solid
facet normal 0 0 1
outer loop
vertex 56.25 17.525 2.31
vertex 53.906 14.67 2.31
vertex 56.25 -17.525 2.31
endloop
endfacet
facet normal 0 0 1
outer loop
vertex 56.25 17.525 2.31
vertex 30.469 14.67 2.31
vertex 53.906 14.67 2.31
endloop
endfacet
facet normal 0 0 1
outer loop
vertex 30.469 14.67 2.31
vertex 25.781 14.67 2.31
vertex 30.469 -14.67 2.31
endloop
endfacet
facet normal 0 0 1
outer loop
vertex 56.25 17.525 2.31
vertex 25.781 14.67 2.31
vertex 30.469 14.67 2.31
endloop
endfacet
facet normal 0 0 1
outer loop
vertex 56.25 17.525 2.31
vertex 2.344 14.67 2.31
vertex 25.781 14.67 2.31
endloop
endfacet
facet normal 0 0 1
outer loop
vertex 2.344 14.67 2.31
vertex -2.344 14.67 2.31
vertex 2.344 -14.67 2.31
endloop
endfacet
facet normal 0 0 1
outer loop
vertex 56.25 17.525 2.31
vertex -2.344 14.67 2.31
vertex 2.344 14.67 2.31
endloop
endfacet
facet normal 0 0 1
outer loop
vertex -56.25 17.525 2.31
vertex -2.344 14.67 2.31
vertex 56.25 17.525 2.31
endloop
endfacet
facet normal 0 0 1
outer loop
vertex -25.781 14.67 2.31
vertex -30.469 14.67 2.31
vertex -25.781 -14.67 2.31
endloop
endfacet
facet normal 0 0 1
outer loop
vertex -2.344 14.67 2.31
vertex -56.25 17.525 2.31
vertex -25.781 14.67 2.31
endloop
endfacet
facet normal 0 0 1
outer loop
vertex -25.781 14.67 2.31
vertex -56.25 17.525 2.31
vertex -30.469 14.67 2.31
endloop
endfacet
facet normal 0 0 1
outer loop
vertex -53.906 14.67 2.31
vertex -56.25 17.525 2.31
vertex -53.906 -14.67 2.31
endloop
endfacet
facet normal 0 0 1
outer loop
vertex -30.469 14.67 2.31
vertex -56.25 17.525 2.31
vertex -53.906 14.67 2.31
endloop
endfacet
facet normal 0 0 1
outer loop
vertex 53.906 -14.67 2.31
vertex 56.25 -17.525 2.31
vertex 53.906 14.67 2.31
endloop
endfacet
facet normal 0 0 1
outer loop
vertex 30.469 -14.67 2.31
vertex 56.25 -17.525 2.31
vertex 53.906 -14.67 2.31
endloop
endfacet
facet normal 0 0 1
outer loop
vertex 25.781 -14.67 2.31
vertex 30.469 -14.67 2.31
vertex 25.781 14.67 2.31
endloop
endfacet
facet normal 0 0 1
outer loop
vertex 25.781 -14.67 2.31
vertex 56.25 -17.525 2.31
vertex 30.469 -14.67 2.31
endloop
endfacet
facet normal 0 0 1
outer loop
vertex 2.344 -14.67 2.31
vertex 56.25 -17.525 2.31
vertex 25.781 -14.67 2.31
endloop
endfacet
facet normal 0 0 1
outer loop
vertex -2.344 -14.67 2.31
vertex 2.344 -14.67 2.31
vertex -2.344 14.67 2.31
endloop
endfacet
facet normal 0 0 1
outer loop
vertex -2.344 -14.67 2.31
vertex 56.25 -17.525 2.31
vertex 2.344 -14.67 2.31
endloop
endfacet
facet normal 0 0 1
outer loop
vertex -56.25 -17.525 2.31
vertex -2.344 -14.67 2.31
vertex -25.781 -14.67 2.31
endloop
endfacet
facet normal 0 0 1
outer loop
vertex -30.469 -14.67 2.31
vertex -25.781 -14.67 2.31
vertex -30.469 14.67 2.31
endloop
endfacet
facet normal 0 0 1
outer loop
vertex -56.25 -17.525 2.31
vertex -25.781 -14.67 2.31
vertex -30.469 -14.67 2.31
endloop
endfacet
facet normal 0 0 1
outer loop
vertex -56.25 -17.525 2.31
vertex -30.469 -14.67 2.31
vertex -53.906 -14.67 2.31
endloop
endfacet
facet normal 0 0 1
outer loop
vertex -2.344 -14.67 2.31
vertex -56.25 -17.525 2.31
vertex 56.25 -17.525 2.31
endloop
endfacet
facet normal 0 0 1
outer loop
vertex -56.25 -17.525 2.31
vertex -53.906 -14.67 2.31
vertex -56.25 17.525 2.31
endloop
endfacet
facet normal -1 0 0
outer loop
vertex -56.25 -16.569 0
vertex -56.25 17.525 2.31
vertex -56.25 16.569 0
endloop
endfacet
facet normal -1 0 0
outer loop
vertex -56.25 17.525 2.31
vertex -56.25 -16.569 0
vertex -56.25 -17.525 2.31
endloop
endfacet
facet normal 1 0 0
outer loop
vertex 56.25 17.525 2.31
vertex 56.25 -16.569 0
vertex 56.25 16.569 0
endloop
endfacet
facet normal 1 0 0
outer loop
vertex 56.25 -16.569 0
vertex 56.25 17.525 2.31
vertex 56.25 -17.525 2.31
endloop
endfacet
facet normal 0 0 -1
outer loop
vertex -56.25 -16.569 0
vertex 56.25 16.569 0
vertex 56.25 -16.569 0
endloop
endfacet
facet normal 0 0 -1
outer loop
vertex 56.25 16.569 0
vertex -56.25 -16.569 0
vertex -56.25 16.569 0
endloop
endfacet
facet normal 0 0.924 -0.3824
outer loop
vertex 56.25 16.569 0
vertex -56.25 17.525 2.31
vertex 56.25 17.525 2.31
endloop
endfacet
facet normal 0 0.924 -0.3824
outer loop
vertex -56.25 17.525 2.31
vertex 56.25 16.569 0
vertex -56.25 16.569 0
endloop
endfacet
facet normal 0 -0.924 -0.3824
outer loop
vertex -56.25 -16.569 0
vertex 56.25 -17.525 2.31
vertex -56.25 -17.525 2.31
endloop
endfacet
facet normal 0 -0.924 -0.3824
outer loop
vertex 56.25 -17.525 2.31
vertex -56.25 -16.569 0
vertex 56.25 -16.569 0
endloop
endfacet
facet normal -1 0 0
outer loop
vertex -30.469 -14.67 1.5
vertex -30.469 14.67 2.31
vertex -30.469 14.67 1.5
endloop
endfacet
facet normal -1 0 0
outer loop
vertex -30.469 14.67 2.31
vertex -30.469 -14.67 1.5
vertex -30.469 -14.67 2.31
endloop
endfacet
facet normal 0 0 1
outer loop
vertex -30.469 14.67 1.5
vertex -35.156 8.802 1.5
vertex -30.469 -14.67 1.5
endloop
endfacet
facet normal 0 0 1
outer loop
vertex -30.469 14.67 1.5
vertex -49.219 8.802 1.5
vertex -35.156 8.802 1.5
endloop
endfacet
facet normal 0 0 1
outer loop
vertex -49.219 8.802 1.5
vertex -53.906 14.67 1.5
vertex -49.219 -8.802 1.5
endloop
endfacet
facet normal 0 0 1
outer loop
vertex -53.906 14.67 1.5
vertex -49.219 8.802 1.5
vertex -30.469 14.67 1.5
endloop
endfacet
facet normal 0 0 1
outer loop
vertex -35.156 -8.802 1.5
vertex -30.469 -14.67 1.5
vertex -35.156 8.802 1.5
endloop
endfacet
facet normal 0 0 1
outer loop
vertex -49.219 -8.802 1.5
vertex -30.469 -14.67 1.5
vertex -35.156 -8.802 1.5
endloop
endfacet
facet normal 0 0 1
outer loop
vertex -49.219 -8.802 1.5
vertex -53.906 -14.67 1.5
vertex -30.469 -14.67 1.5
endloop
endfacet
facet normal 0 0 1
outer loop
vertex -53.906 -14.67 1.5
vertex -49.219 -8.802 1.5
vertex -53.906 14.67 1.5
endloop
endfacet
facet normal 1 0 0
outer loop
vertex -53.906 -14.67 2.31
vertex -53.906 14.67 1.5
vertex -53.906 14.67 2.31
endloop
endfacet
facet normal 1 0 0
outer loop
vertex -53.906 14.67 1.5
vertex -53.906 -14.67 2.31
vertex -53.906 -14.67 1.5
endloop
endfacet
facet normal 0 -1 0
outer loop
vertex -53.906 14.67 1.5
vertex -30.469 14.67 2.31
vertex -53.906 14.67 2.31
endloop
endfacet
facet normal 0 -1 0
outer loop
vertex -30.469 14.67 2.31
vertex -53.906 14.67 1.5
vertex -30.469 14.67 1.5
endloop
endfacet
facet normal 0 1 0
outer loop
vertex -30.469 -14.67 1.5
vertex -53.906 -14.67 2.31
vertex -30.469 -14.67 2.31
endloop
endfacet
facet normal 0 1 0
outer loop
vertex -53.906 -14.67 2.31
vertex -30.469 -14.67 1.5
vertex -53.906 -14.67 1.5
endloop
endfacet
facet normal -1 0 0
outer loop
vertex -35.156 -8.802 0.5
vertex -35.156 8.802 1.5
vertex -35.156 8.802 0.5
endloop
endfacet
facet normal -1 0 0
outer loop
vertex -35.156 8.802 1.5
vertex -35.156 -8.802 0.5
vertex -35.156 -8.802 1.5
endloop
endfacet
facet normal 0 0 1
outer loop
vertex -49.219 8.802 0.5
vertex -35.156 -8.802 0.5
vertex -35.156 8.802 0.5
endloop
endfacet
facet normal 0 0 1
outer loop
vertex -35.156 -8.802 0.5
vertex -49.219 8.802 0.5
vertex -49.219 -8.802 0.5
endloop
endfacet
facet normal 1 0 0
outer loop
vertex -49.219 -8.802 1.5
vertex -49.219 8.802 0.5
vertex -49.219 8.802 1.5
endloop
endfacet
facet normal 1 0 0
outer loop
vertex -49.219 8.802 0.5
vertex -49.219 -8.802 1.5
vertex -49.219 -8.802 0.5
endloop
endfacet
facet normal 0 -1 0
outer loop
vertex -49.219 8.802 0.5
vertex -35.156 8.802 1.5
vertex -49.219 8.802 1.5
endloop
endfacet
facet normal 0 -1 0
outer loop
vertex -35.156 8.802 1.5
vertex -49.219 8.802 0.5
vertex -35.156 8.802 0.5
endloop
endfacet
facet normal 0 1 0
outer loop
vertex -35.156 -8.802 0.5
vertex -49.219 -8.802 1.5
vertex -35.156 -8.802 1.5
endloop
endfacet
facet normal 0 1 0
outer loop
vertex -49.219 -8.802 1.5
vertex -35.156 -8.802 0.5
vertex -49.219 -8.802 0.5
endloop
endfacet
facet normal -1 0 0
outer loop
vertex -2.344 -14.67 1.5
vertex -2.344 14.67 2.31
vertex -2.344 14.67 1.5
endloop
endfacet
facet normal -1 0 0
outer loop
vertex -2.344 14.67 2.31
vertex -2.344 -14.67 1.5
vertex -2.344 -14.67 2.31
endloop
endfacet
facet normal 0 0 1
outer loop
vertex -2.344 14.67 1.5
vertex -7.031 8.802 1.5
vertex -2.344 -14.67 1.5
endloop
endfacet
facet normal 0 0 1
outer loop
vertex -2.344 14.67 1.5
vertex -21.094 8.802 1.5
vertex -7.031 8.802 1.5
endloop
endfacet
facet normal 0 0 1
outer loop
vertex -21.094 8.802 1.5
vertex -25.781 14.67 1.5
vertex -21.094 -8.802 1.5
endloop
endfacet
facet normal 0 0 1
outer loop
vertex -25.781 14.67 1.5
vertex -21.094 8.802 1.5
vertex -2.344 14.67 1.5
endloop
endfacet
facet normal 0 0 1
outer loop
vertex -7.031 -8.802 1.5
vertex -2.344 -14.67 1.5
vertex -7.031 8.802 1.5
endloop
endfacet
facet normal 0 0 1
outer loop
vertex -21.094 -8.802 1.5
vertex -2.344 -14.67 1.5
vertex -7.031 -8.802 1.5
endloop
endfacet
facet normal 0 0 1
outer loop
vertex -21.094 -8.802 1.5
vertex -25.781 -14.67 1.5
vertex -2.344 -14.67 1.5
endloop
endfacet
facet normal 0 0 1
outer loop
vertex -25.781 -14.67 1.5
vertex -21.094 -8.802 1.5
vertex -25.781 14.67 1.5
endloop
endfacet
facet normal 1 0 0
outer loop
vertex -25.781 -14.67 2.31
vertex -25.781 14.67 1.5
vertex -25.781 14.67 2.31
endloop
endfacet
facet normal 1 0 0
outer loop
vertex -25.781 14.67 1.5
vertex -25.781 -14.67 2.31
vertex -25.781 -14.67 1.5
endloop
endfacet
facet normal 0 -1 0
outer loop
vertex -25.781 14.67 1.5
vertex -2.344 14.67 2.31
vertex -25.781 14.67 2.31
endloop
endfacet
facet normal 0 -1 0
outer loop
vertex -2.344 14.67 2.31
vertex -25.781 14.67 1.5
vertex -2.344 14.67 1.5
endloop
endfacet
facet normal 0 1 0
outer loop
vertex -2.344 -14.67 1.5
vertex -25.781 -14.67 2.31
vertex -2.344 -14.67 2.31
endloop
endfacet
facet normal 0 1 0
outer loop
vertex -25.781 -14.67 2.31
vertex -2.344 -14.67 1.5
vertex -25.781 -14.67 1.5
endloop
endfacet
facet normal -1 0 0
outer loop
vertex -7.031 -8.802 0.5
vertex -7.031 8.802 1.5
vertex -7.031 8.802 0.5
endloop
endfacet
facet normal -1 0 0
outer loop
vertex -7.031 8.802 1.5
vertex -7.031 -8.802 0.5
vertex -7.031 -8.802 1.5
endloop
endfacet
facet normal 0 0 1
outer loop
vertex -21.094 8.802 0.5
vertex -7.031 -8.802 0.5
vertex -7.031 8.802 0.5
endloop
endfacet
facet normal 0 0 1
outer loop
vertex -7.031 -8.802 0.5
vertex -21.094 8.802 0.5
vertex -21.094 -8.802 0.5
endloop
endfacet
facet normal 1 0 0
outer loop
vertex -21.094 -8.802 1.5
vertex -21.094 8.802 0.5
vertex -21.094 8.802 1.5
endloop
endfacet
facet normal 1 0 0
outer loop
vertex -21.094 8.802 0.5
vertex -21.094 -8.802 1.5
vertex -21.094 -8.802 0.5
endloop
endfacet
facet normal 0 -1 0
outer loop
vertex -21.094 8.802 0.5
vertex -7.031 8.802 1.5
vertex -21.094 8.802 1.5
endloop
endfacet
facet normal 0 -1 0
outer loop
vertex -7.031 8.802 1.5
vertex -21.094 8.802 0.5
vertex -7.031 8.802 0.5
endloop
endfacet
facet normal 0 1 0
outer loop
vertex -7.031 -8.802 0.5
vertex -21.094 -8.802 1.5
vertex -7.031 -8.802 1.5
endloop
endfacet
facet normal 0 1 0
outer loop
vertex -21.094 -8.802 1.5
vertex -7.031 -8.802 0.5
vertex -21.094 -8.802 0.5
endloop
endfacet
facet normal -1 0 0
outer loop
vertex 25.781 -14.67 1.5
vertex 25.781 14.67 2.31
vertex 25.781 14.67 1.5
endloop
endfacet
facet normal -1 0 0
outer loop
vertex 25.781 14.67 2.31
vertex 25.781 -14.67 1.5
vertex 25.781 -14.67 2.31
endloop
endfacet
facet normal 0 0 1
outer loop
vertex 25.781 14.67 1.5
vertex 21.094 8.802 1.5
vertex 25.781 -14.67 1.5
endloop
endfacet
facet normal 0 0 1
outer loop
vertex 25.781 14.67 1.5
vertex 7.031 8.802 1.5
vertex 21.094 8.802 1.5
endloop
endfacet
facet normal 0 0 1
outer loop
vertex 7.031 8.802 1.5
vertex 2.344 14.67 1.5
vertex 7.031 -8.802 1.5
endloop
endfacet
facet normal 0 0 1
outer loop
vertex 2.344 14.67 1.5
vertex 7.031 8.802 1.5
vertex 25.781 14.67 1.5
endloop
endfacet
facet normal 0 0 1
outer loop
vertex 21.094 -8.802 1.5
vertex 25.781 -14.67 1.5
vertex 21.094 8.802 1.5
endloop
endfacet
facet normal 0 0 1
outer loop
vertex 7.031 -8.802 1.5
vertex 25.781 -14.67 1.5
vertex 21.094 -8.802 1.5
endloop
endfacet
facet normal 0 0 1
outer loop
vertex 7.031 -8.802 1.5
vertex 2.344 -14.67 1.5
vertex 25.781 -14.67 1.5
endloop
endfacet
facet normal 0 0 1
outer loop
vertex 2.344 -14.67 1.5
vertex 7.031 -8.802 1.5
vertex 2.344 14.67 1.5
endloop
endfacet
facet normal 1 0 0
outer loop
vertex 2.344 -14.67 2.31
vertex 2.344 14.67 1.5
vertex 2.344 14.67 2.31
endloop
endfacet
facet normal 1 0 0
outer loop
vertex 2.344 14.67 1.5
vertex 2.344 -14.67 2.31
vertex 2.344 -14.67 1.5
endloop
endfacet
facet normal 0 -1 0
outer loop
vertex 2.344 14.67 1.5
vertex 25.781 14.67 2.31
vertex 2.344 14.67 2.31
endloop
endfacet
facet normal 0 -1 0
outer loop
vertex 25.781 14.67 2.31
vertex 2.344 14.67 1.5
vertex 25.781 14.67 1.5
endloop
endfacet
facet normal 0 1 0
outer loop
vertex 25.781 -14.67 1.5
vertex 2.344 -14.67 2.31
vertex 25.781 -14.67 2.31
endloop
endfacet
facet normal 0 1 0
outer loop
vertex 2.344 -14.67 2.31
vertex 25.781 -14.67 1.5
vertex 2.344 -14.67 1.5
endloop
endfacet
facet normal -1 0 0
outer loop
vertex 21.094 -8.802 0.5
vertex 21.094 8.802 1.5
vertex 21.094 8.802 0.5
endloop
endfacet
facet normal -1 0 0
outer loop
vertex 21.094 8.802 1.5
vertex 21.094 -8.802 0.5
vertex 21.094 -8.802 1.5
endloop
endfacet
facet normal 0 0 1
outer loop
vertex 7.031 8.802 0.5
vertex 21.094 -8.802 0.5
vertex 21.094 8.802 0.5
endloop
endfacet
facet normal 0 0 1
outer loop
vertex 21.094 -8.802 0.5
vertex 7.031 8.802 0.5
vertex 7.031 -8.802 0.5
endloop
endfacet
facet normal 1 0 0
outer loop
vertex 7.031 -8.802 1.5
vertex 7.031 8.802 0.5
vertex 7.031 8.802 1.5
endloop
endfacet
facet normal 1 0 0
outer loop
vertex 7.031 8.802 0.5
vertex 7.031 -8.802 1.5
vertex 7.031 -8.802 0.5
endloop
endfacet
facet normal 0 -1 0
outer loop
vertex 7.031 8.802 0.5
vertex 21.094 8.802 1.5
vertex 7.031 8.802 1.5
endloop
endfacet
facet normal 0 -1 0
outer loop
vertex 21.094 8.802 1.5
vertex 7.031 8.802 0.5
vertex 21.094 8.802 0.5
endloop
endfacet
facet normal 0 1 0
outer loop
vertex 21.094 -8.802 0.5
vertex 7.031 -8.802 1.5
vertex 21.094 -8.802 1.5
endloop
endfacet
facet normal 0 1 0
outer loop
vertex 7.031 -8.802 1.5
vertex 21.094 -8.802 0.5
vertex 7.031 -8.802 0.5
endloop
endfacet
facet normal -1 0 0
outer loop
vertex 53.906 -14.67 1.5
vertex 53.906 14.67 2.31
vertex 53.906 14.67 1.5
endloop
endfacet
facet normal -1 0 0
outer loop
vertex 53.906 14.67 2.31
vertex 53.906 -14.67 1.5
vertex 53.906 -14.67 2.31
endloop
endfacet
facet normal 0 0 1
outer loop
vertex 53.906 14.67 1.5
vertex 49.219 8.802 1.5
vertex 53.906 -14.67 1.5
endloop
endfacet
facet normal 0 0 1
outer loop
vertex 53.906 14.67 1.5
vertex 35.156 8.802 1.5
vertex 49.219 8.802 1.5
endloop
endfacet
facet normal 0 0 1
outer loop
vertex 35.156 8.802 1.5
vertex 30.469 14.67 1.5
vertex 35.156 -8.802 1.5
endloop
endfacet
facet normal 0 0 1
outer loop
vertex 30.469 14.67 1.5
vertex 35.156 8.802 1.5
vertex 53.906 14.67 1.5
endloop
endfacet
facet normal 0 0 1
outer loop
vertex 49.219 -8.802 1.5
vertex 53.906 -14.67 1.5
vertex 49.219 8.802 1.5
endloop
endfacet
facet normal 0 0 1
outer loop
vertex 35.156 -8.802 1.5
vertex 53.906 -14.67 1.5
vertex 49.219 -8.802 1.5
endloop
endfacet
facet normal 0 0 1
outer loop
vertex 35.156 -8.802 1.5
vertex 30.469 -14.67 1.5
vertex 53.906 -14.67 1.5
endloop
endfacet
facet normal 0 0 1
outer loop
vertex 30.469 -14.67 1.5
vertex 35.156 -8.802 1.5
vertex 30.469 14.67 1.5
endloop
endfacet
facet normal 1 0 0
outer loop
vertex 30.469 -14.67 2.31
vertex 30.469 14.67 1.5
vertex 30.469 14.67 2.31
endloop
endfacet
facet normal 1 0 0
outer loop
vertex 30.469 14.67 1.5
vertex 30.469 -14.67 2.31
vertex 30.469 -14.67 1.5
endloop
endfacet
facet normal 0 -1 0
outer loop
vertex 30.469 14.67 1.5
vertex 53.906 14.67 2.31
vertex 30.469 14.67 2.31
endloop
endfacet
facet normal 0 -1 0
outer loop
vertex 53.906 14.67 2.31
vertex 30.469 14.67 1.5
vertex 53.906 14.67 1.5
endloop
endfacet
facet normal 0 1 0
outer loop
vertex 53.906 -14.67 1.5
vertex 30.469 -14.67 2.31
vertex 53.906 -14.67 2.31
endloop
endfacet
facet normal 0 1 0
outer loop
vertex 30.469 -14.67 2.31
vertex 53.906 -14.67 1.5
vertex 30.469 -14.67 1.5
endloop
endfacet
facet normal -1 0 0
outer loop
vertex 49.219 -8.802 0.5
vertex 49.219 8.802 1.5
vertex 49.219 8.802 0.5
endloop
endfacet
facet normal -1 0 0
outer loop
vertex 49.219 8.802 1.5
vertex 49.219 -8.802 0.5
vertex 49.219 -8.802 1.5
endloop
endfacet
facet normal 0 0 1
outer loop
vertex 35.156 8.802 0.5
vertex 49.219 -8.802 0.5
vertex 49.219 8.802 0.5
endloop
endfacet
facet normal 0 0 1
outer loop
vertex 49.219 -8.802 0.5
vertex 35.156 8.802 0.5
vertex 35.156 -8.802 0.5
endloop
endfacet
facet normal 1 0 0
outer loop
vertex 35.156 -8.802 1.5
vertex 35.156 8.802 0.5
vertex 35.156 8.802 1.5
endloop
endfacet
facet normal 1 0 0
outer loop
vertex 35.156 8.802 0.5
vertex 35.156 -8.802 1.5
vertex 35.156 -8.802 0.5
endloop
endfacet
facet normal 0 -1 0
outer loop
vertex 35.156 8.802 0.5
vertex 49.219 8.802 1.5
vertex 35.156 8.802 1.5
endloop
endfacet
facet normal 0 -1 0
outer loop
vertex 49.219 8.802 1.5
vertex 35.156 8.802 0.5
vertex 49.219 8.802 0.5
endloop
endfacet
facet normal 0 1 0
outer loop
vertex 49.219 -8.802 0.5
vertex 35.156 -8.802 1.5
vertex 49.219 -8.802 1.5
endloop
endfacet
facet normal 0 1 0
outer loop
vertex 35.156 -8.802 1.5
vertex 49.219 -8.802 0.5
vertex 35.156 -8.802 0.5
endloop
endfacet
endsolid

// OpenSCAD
// Paneled cache pot rectangles panel.

// ---------- Public parameters (mm) ----------
inside_radius = 75 / 2;
inside_height = 110;
min_wall_thickness = 2.5;
bottom_thickness = 2.5;
bottom_edge_width = 10;
num_panels = 8;
panel_thickness = 2.5;
groove_depth = 1.0;

// ---------- Resolution ----------
$fa = 1;
$fs = 1;

// ---------- Derived ----------
outside_height = inside_height + bottom_thickness;
outside_radius = (inside_radius + min_wall_thickness) / cos(180 / num_panels);
panel_extra_radius = panel_thickness / cos(180 / num_panels);
panel_width = (outside_radius + panel_extra_radius) * 2 * sin(180/num_panels);

module outside_cylinder() {
  cylinder(outside_height, outside_radius, outside_radius, $fn = num_panels);
}

module inside_cutout() {
  translate([0, 0, bottom_thickness])
    cylinder(inside_height + 1, inside_radius, inside_radius);
  translate([0, 0, -0.5 * bottom_thickness])
    cylinder(2 * bottom_thickness, inside_radius - bottom_edge_width, inside_radius - bottom_edge_width);
}

module core() {
  difference() {
    outside_cylinder();
    inside_cutout();
  }
}

module panel() {
  difference() {
    cylinder(outside_height, outside_radius + panel_thickness, outside_radius + panel_thickness, $fn = num_panels);
    translate([0, 0, -1])
      cylinder(outside_height + 2, outside_radius, outside_radius, $fn = num_panels);
    translate([-(outside_radius + panel_thickness + 1), 0, -1])
      cube([2 * (outside_radius + panel_thickness + 1), 2 * (outside_radius + panel_thickness + 1), outside_height + 2]);
    rotate([0, 0, 180 - 360 / num_panels])
      translate([-(outside_radius + panel_thickness + 1), 0, -1])
        cube([2 * (outside_radius + panel_thickness + 1), 2 * (outside_radius + panel_thickness + 1), outside_height + 2]);
  }
}

module panel_flat_on_bed() {
  translate([outside_height / 2, 0, -(inside_radius + min_wall_thickness)])
    rotate([0, -90, 0])
      rotate([0, 0, 180 / num_panels])
        panel();
}

module panel_groove() {
    groove_x = outside_height / 4;
    groove_y = panel_width;
    translate([0, 0, panel_thickness * 1.5 - groove_depth]) cube([groove_x * 5 / 6, groove_y * 5 / 6, panel_thickness], center=true);
    translate([0, 0, panel_thickness * 1.5 - 2 * groove_depth]) cube([groove_x * 3 / 6, groove_y * 3 / 6, panel_thickness], center=true);
}

module grooved_panel() {
    groove_x = outside_height / 4;
    difference() {
        panel_flat_on_bed();
        translate([-1.5 * groove_x, 0, 0]) panel_groove();
        translate([-0.5 * groove_x, 0, 0]) panel_groove();
        translate([0.5 * groove_x, 0, 0]) panel_groove();
        translate([1.5 * groove_x, 0, 0]) panel_groove();
    }
}

grooved_panel();
//color("red") panel();
//color("yellow") core();
